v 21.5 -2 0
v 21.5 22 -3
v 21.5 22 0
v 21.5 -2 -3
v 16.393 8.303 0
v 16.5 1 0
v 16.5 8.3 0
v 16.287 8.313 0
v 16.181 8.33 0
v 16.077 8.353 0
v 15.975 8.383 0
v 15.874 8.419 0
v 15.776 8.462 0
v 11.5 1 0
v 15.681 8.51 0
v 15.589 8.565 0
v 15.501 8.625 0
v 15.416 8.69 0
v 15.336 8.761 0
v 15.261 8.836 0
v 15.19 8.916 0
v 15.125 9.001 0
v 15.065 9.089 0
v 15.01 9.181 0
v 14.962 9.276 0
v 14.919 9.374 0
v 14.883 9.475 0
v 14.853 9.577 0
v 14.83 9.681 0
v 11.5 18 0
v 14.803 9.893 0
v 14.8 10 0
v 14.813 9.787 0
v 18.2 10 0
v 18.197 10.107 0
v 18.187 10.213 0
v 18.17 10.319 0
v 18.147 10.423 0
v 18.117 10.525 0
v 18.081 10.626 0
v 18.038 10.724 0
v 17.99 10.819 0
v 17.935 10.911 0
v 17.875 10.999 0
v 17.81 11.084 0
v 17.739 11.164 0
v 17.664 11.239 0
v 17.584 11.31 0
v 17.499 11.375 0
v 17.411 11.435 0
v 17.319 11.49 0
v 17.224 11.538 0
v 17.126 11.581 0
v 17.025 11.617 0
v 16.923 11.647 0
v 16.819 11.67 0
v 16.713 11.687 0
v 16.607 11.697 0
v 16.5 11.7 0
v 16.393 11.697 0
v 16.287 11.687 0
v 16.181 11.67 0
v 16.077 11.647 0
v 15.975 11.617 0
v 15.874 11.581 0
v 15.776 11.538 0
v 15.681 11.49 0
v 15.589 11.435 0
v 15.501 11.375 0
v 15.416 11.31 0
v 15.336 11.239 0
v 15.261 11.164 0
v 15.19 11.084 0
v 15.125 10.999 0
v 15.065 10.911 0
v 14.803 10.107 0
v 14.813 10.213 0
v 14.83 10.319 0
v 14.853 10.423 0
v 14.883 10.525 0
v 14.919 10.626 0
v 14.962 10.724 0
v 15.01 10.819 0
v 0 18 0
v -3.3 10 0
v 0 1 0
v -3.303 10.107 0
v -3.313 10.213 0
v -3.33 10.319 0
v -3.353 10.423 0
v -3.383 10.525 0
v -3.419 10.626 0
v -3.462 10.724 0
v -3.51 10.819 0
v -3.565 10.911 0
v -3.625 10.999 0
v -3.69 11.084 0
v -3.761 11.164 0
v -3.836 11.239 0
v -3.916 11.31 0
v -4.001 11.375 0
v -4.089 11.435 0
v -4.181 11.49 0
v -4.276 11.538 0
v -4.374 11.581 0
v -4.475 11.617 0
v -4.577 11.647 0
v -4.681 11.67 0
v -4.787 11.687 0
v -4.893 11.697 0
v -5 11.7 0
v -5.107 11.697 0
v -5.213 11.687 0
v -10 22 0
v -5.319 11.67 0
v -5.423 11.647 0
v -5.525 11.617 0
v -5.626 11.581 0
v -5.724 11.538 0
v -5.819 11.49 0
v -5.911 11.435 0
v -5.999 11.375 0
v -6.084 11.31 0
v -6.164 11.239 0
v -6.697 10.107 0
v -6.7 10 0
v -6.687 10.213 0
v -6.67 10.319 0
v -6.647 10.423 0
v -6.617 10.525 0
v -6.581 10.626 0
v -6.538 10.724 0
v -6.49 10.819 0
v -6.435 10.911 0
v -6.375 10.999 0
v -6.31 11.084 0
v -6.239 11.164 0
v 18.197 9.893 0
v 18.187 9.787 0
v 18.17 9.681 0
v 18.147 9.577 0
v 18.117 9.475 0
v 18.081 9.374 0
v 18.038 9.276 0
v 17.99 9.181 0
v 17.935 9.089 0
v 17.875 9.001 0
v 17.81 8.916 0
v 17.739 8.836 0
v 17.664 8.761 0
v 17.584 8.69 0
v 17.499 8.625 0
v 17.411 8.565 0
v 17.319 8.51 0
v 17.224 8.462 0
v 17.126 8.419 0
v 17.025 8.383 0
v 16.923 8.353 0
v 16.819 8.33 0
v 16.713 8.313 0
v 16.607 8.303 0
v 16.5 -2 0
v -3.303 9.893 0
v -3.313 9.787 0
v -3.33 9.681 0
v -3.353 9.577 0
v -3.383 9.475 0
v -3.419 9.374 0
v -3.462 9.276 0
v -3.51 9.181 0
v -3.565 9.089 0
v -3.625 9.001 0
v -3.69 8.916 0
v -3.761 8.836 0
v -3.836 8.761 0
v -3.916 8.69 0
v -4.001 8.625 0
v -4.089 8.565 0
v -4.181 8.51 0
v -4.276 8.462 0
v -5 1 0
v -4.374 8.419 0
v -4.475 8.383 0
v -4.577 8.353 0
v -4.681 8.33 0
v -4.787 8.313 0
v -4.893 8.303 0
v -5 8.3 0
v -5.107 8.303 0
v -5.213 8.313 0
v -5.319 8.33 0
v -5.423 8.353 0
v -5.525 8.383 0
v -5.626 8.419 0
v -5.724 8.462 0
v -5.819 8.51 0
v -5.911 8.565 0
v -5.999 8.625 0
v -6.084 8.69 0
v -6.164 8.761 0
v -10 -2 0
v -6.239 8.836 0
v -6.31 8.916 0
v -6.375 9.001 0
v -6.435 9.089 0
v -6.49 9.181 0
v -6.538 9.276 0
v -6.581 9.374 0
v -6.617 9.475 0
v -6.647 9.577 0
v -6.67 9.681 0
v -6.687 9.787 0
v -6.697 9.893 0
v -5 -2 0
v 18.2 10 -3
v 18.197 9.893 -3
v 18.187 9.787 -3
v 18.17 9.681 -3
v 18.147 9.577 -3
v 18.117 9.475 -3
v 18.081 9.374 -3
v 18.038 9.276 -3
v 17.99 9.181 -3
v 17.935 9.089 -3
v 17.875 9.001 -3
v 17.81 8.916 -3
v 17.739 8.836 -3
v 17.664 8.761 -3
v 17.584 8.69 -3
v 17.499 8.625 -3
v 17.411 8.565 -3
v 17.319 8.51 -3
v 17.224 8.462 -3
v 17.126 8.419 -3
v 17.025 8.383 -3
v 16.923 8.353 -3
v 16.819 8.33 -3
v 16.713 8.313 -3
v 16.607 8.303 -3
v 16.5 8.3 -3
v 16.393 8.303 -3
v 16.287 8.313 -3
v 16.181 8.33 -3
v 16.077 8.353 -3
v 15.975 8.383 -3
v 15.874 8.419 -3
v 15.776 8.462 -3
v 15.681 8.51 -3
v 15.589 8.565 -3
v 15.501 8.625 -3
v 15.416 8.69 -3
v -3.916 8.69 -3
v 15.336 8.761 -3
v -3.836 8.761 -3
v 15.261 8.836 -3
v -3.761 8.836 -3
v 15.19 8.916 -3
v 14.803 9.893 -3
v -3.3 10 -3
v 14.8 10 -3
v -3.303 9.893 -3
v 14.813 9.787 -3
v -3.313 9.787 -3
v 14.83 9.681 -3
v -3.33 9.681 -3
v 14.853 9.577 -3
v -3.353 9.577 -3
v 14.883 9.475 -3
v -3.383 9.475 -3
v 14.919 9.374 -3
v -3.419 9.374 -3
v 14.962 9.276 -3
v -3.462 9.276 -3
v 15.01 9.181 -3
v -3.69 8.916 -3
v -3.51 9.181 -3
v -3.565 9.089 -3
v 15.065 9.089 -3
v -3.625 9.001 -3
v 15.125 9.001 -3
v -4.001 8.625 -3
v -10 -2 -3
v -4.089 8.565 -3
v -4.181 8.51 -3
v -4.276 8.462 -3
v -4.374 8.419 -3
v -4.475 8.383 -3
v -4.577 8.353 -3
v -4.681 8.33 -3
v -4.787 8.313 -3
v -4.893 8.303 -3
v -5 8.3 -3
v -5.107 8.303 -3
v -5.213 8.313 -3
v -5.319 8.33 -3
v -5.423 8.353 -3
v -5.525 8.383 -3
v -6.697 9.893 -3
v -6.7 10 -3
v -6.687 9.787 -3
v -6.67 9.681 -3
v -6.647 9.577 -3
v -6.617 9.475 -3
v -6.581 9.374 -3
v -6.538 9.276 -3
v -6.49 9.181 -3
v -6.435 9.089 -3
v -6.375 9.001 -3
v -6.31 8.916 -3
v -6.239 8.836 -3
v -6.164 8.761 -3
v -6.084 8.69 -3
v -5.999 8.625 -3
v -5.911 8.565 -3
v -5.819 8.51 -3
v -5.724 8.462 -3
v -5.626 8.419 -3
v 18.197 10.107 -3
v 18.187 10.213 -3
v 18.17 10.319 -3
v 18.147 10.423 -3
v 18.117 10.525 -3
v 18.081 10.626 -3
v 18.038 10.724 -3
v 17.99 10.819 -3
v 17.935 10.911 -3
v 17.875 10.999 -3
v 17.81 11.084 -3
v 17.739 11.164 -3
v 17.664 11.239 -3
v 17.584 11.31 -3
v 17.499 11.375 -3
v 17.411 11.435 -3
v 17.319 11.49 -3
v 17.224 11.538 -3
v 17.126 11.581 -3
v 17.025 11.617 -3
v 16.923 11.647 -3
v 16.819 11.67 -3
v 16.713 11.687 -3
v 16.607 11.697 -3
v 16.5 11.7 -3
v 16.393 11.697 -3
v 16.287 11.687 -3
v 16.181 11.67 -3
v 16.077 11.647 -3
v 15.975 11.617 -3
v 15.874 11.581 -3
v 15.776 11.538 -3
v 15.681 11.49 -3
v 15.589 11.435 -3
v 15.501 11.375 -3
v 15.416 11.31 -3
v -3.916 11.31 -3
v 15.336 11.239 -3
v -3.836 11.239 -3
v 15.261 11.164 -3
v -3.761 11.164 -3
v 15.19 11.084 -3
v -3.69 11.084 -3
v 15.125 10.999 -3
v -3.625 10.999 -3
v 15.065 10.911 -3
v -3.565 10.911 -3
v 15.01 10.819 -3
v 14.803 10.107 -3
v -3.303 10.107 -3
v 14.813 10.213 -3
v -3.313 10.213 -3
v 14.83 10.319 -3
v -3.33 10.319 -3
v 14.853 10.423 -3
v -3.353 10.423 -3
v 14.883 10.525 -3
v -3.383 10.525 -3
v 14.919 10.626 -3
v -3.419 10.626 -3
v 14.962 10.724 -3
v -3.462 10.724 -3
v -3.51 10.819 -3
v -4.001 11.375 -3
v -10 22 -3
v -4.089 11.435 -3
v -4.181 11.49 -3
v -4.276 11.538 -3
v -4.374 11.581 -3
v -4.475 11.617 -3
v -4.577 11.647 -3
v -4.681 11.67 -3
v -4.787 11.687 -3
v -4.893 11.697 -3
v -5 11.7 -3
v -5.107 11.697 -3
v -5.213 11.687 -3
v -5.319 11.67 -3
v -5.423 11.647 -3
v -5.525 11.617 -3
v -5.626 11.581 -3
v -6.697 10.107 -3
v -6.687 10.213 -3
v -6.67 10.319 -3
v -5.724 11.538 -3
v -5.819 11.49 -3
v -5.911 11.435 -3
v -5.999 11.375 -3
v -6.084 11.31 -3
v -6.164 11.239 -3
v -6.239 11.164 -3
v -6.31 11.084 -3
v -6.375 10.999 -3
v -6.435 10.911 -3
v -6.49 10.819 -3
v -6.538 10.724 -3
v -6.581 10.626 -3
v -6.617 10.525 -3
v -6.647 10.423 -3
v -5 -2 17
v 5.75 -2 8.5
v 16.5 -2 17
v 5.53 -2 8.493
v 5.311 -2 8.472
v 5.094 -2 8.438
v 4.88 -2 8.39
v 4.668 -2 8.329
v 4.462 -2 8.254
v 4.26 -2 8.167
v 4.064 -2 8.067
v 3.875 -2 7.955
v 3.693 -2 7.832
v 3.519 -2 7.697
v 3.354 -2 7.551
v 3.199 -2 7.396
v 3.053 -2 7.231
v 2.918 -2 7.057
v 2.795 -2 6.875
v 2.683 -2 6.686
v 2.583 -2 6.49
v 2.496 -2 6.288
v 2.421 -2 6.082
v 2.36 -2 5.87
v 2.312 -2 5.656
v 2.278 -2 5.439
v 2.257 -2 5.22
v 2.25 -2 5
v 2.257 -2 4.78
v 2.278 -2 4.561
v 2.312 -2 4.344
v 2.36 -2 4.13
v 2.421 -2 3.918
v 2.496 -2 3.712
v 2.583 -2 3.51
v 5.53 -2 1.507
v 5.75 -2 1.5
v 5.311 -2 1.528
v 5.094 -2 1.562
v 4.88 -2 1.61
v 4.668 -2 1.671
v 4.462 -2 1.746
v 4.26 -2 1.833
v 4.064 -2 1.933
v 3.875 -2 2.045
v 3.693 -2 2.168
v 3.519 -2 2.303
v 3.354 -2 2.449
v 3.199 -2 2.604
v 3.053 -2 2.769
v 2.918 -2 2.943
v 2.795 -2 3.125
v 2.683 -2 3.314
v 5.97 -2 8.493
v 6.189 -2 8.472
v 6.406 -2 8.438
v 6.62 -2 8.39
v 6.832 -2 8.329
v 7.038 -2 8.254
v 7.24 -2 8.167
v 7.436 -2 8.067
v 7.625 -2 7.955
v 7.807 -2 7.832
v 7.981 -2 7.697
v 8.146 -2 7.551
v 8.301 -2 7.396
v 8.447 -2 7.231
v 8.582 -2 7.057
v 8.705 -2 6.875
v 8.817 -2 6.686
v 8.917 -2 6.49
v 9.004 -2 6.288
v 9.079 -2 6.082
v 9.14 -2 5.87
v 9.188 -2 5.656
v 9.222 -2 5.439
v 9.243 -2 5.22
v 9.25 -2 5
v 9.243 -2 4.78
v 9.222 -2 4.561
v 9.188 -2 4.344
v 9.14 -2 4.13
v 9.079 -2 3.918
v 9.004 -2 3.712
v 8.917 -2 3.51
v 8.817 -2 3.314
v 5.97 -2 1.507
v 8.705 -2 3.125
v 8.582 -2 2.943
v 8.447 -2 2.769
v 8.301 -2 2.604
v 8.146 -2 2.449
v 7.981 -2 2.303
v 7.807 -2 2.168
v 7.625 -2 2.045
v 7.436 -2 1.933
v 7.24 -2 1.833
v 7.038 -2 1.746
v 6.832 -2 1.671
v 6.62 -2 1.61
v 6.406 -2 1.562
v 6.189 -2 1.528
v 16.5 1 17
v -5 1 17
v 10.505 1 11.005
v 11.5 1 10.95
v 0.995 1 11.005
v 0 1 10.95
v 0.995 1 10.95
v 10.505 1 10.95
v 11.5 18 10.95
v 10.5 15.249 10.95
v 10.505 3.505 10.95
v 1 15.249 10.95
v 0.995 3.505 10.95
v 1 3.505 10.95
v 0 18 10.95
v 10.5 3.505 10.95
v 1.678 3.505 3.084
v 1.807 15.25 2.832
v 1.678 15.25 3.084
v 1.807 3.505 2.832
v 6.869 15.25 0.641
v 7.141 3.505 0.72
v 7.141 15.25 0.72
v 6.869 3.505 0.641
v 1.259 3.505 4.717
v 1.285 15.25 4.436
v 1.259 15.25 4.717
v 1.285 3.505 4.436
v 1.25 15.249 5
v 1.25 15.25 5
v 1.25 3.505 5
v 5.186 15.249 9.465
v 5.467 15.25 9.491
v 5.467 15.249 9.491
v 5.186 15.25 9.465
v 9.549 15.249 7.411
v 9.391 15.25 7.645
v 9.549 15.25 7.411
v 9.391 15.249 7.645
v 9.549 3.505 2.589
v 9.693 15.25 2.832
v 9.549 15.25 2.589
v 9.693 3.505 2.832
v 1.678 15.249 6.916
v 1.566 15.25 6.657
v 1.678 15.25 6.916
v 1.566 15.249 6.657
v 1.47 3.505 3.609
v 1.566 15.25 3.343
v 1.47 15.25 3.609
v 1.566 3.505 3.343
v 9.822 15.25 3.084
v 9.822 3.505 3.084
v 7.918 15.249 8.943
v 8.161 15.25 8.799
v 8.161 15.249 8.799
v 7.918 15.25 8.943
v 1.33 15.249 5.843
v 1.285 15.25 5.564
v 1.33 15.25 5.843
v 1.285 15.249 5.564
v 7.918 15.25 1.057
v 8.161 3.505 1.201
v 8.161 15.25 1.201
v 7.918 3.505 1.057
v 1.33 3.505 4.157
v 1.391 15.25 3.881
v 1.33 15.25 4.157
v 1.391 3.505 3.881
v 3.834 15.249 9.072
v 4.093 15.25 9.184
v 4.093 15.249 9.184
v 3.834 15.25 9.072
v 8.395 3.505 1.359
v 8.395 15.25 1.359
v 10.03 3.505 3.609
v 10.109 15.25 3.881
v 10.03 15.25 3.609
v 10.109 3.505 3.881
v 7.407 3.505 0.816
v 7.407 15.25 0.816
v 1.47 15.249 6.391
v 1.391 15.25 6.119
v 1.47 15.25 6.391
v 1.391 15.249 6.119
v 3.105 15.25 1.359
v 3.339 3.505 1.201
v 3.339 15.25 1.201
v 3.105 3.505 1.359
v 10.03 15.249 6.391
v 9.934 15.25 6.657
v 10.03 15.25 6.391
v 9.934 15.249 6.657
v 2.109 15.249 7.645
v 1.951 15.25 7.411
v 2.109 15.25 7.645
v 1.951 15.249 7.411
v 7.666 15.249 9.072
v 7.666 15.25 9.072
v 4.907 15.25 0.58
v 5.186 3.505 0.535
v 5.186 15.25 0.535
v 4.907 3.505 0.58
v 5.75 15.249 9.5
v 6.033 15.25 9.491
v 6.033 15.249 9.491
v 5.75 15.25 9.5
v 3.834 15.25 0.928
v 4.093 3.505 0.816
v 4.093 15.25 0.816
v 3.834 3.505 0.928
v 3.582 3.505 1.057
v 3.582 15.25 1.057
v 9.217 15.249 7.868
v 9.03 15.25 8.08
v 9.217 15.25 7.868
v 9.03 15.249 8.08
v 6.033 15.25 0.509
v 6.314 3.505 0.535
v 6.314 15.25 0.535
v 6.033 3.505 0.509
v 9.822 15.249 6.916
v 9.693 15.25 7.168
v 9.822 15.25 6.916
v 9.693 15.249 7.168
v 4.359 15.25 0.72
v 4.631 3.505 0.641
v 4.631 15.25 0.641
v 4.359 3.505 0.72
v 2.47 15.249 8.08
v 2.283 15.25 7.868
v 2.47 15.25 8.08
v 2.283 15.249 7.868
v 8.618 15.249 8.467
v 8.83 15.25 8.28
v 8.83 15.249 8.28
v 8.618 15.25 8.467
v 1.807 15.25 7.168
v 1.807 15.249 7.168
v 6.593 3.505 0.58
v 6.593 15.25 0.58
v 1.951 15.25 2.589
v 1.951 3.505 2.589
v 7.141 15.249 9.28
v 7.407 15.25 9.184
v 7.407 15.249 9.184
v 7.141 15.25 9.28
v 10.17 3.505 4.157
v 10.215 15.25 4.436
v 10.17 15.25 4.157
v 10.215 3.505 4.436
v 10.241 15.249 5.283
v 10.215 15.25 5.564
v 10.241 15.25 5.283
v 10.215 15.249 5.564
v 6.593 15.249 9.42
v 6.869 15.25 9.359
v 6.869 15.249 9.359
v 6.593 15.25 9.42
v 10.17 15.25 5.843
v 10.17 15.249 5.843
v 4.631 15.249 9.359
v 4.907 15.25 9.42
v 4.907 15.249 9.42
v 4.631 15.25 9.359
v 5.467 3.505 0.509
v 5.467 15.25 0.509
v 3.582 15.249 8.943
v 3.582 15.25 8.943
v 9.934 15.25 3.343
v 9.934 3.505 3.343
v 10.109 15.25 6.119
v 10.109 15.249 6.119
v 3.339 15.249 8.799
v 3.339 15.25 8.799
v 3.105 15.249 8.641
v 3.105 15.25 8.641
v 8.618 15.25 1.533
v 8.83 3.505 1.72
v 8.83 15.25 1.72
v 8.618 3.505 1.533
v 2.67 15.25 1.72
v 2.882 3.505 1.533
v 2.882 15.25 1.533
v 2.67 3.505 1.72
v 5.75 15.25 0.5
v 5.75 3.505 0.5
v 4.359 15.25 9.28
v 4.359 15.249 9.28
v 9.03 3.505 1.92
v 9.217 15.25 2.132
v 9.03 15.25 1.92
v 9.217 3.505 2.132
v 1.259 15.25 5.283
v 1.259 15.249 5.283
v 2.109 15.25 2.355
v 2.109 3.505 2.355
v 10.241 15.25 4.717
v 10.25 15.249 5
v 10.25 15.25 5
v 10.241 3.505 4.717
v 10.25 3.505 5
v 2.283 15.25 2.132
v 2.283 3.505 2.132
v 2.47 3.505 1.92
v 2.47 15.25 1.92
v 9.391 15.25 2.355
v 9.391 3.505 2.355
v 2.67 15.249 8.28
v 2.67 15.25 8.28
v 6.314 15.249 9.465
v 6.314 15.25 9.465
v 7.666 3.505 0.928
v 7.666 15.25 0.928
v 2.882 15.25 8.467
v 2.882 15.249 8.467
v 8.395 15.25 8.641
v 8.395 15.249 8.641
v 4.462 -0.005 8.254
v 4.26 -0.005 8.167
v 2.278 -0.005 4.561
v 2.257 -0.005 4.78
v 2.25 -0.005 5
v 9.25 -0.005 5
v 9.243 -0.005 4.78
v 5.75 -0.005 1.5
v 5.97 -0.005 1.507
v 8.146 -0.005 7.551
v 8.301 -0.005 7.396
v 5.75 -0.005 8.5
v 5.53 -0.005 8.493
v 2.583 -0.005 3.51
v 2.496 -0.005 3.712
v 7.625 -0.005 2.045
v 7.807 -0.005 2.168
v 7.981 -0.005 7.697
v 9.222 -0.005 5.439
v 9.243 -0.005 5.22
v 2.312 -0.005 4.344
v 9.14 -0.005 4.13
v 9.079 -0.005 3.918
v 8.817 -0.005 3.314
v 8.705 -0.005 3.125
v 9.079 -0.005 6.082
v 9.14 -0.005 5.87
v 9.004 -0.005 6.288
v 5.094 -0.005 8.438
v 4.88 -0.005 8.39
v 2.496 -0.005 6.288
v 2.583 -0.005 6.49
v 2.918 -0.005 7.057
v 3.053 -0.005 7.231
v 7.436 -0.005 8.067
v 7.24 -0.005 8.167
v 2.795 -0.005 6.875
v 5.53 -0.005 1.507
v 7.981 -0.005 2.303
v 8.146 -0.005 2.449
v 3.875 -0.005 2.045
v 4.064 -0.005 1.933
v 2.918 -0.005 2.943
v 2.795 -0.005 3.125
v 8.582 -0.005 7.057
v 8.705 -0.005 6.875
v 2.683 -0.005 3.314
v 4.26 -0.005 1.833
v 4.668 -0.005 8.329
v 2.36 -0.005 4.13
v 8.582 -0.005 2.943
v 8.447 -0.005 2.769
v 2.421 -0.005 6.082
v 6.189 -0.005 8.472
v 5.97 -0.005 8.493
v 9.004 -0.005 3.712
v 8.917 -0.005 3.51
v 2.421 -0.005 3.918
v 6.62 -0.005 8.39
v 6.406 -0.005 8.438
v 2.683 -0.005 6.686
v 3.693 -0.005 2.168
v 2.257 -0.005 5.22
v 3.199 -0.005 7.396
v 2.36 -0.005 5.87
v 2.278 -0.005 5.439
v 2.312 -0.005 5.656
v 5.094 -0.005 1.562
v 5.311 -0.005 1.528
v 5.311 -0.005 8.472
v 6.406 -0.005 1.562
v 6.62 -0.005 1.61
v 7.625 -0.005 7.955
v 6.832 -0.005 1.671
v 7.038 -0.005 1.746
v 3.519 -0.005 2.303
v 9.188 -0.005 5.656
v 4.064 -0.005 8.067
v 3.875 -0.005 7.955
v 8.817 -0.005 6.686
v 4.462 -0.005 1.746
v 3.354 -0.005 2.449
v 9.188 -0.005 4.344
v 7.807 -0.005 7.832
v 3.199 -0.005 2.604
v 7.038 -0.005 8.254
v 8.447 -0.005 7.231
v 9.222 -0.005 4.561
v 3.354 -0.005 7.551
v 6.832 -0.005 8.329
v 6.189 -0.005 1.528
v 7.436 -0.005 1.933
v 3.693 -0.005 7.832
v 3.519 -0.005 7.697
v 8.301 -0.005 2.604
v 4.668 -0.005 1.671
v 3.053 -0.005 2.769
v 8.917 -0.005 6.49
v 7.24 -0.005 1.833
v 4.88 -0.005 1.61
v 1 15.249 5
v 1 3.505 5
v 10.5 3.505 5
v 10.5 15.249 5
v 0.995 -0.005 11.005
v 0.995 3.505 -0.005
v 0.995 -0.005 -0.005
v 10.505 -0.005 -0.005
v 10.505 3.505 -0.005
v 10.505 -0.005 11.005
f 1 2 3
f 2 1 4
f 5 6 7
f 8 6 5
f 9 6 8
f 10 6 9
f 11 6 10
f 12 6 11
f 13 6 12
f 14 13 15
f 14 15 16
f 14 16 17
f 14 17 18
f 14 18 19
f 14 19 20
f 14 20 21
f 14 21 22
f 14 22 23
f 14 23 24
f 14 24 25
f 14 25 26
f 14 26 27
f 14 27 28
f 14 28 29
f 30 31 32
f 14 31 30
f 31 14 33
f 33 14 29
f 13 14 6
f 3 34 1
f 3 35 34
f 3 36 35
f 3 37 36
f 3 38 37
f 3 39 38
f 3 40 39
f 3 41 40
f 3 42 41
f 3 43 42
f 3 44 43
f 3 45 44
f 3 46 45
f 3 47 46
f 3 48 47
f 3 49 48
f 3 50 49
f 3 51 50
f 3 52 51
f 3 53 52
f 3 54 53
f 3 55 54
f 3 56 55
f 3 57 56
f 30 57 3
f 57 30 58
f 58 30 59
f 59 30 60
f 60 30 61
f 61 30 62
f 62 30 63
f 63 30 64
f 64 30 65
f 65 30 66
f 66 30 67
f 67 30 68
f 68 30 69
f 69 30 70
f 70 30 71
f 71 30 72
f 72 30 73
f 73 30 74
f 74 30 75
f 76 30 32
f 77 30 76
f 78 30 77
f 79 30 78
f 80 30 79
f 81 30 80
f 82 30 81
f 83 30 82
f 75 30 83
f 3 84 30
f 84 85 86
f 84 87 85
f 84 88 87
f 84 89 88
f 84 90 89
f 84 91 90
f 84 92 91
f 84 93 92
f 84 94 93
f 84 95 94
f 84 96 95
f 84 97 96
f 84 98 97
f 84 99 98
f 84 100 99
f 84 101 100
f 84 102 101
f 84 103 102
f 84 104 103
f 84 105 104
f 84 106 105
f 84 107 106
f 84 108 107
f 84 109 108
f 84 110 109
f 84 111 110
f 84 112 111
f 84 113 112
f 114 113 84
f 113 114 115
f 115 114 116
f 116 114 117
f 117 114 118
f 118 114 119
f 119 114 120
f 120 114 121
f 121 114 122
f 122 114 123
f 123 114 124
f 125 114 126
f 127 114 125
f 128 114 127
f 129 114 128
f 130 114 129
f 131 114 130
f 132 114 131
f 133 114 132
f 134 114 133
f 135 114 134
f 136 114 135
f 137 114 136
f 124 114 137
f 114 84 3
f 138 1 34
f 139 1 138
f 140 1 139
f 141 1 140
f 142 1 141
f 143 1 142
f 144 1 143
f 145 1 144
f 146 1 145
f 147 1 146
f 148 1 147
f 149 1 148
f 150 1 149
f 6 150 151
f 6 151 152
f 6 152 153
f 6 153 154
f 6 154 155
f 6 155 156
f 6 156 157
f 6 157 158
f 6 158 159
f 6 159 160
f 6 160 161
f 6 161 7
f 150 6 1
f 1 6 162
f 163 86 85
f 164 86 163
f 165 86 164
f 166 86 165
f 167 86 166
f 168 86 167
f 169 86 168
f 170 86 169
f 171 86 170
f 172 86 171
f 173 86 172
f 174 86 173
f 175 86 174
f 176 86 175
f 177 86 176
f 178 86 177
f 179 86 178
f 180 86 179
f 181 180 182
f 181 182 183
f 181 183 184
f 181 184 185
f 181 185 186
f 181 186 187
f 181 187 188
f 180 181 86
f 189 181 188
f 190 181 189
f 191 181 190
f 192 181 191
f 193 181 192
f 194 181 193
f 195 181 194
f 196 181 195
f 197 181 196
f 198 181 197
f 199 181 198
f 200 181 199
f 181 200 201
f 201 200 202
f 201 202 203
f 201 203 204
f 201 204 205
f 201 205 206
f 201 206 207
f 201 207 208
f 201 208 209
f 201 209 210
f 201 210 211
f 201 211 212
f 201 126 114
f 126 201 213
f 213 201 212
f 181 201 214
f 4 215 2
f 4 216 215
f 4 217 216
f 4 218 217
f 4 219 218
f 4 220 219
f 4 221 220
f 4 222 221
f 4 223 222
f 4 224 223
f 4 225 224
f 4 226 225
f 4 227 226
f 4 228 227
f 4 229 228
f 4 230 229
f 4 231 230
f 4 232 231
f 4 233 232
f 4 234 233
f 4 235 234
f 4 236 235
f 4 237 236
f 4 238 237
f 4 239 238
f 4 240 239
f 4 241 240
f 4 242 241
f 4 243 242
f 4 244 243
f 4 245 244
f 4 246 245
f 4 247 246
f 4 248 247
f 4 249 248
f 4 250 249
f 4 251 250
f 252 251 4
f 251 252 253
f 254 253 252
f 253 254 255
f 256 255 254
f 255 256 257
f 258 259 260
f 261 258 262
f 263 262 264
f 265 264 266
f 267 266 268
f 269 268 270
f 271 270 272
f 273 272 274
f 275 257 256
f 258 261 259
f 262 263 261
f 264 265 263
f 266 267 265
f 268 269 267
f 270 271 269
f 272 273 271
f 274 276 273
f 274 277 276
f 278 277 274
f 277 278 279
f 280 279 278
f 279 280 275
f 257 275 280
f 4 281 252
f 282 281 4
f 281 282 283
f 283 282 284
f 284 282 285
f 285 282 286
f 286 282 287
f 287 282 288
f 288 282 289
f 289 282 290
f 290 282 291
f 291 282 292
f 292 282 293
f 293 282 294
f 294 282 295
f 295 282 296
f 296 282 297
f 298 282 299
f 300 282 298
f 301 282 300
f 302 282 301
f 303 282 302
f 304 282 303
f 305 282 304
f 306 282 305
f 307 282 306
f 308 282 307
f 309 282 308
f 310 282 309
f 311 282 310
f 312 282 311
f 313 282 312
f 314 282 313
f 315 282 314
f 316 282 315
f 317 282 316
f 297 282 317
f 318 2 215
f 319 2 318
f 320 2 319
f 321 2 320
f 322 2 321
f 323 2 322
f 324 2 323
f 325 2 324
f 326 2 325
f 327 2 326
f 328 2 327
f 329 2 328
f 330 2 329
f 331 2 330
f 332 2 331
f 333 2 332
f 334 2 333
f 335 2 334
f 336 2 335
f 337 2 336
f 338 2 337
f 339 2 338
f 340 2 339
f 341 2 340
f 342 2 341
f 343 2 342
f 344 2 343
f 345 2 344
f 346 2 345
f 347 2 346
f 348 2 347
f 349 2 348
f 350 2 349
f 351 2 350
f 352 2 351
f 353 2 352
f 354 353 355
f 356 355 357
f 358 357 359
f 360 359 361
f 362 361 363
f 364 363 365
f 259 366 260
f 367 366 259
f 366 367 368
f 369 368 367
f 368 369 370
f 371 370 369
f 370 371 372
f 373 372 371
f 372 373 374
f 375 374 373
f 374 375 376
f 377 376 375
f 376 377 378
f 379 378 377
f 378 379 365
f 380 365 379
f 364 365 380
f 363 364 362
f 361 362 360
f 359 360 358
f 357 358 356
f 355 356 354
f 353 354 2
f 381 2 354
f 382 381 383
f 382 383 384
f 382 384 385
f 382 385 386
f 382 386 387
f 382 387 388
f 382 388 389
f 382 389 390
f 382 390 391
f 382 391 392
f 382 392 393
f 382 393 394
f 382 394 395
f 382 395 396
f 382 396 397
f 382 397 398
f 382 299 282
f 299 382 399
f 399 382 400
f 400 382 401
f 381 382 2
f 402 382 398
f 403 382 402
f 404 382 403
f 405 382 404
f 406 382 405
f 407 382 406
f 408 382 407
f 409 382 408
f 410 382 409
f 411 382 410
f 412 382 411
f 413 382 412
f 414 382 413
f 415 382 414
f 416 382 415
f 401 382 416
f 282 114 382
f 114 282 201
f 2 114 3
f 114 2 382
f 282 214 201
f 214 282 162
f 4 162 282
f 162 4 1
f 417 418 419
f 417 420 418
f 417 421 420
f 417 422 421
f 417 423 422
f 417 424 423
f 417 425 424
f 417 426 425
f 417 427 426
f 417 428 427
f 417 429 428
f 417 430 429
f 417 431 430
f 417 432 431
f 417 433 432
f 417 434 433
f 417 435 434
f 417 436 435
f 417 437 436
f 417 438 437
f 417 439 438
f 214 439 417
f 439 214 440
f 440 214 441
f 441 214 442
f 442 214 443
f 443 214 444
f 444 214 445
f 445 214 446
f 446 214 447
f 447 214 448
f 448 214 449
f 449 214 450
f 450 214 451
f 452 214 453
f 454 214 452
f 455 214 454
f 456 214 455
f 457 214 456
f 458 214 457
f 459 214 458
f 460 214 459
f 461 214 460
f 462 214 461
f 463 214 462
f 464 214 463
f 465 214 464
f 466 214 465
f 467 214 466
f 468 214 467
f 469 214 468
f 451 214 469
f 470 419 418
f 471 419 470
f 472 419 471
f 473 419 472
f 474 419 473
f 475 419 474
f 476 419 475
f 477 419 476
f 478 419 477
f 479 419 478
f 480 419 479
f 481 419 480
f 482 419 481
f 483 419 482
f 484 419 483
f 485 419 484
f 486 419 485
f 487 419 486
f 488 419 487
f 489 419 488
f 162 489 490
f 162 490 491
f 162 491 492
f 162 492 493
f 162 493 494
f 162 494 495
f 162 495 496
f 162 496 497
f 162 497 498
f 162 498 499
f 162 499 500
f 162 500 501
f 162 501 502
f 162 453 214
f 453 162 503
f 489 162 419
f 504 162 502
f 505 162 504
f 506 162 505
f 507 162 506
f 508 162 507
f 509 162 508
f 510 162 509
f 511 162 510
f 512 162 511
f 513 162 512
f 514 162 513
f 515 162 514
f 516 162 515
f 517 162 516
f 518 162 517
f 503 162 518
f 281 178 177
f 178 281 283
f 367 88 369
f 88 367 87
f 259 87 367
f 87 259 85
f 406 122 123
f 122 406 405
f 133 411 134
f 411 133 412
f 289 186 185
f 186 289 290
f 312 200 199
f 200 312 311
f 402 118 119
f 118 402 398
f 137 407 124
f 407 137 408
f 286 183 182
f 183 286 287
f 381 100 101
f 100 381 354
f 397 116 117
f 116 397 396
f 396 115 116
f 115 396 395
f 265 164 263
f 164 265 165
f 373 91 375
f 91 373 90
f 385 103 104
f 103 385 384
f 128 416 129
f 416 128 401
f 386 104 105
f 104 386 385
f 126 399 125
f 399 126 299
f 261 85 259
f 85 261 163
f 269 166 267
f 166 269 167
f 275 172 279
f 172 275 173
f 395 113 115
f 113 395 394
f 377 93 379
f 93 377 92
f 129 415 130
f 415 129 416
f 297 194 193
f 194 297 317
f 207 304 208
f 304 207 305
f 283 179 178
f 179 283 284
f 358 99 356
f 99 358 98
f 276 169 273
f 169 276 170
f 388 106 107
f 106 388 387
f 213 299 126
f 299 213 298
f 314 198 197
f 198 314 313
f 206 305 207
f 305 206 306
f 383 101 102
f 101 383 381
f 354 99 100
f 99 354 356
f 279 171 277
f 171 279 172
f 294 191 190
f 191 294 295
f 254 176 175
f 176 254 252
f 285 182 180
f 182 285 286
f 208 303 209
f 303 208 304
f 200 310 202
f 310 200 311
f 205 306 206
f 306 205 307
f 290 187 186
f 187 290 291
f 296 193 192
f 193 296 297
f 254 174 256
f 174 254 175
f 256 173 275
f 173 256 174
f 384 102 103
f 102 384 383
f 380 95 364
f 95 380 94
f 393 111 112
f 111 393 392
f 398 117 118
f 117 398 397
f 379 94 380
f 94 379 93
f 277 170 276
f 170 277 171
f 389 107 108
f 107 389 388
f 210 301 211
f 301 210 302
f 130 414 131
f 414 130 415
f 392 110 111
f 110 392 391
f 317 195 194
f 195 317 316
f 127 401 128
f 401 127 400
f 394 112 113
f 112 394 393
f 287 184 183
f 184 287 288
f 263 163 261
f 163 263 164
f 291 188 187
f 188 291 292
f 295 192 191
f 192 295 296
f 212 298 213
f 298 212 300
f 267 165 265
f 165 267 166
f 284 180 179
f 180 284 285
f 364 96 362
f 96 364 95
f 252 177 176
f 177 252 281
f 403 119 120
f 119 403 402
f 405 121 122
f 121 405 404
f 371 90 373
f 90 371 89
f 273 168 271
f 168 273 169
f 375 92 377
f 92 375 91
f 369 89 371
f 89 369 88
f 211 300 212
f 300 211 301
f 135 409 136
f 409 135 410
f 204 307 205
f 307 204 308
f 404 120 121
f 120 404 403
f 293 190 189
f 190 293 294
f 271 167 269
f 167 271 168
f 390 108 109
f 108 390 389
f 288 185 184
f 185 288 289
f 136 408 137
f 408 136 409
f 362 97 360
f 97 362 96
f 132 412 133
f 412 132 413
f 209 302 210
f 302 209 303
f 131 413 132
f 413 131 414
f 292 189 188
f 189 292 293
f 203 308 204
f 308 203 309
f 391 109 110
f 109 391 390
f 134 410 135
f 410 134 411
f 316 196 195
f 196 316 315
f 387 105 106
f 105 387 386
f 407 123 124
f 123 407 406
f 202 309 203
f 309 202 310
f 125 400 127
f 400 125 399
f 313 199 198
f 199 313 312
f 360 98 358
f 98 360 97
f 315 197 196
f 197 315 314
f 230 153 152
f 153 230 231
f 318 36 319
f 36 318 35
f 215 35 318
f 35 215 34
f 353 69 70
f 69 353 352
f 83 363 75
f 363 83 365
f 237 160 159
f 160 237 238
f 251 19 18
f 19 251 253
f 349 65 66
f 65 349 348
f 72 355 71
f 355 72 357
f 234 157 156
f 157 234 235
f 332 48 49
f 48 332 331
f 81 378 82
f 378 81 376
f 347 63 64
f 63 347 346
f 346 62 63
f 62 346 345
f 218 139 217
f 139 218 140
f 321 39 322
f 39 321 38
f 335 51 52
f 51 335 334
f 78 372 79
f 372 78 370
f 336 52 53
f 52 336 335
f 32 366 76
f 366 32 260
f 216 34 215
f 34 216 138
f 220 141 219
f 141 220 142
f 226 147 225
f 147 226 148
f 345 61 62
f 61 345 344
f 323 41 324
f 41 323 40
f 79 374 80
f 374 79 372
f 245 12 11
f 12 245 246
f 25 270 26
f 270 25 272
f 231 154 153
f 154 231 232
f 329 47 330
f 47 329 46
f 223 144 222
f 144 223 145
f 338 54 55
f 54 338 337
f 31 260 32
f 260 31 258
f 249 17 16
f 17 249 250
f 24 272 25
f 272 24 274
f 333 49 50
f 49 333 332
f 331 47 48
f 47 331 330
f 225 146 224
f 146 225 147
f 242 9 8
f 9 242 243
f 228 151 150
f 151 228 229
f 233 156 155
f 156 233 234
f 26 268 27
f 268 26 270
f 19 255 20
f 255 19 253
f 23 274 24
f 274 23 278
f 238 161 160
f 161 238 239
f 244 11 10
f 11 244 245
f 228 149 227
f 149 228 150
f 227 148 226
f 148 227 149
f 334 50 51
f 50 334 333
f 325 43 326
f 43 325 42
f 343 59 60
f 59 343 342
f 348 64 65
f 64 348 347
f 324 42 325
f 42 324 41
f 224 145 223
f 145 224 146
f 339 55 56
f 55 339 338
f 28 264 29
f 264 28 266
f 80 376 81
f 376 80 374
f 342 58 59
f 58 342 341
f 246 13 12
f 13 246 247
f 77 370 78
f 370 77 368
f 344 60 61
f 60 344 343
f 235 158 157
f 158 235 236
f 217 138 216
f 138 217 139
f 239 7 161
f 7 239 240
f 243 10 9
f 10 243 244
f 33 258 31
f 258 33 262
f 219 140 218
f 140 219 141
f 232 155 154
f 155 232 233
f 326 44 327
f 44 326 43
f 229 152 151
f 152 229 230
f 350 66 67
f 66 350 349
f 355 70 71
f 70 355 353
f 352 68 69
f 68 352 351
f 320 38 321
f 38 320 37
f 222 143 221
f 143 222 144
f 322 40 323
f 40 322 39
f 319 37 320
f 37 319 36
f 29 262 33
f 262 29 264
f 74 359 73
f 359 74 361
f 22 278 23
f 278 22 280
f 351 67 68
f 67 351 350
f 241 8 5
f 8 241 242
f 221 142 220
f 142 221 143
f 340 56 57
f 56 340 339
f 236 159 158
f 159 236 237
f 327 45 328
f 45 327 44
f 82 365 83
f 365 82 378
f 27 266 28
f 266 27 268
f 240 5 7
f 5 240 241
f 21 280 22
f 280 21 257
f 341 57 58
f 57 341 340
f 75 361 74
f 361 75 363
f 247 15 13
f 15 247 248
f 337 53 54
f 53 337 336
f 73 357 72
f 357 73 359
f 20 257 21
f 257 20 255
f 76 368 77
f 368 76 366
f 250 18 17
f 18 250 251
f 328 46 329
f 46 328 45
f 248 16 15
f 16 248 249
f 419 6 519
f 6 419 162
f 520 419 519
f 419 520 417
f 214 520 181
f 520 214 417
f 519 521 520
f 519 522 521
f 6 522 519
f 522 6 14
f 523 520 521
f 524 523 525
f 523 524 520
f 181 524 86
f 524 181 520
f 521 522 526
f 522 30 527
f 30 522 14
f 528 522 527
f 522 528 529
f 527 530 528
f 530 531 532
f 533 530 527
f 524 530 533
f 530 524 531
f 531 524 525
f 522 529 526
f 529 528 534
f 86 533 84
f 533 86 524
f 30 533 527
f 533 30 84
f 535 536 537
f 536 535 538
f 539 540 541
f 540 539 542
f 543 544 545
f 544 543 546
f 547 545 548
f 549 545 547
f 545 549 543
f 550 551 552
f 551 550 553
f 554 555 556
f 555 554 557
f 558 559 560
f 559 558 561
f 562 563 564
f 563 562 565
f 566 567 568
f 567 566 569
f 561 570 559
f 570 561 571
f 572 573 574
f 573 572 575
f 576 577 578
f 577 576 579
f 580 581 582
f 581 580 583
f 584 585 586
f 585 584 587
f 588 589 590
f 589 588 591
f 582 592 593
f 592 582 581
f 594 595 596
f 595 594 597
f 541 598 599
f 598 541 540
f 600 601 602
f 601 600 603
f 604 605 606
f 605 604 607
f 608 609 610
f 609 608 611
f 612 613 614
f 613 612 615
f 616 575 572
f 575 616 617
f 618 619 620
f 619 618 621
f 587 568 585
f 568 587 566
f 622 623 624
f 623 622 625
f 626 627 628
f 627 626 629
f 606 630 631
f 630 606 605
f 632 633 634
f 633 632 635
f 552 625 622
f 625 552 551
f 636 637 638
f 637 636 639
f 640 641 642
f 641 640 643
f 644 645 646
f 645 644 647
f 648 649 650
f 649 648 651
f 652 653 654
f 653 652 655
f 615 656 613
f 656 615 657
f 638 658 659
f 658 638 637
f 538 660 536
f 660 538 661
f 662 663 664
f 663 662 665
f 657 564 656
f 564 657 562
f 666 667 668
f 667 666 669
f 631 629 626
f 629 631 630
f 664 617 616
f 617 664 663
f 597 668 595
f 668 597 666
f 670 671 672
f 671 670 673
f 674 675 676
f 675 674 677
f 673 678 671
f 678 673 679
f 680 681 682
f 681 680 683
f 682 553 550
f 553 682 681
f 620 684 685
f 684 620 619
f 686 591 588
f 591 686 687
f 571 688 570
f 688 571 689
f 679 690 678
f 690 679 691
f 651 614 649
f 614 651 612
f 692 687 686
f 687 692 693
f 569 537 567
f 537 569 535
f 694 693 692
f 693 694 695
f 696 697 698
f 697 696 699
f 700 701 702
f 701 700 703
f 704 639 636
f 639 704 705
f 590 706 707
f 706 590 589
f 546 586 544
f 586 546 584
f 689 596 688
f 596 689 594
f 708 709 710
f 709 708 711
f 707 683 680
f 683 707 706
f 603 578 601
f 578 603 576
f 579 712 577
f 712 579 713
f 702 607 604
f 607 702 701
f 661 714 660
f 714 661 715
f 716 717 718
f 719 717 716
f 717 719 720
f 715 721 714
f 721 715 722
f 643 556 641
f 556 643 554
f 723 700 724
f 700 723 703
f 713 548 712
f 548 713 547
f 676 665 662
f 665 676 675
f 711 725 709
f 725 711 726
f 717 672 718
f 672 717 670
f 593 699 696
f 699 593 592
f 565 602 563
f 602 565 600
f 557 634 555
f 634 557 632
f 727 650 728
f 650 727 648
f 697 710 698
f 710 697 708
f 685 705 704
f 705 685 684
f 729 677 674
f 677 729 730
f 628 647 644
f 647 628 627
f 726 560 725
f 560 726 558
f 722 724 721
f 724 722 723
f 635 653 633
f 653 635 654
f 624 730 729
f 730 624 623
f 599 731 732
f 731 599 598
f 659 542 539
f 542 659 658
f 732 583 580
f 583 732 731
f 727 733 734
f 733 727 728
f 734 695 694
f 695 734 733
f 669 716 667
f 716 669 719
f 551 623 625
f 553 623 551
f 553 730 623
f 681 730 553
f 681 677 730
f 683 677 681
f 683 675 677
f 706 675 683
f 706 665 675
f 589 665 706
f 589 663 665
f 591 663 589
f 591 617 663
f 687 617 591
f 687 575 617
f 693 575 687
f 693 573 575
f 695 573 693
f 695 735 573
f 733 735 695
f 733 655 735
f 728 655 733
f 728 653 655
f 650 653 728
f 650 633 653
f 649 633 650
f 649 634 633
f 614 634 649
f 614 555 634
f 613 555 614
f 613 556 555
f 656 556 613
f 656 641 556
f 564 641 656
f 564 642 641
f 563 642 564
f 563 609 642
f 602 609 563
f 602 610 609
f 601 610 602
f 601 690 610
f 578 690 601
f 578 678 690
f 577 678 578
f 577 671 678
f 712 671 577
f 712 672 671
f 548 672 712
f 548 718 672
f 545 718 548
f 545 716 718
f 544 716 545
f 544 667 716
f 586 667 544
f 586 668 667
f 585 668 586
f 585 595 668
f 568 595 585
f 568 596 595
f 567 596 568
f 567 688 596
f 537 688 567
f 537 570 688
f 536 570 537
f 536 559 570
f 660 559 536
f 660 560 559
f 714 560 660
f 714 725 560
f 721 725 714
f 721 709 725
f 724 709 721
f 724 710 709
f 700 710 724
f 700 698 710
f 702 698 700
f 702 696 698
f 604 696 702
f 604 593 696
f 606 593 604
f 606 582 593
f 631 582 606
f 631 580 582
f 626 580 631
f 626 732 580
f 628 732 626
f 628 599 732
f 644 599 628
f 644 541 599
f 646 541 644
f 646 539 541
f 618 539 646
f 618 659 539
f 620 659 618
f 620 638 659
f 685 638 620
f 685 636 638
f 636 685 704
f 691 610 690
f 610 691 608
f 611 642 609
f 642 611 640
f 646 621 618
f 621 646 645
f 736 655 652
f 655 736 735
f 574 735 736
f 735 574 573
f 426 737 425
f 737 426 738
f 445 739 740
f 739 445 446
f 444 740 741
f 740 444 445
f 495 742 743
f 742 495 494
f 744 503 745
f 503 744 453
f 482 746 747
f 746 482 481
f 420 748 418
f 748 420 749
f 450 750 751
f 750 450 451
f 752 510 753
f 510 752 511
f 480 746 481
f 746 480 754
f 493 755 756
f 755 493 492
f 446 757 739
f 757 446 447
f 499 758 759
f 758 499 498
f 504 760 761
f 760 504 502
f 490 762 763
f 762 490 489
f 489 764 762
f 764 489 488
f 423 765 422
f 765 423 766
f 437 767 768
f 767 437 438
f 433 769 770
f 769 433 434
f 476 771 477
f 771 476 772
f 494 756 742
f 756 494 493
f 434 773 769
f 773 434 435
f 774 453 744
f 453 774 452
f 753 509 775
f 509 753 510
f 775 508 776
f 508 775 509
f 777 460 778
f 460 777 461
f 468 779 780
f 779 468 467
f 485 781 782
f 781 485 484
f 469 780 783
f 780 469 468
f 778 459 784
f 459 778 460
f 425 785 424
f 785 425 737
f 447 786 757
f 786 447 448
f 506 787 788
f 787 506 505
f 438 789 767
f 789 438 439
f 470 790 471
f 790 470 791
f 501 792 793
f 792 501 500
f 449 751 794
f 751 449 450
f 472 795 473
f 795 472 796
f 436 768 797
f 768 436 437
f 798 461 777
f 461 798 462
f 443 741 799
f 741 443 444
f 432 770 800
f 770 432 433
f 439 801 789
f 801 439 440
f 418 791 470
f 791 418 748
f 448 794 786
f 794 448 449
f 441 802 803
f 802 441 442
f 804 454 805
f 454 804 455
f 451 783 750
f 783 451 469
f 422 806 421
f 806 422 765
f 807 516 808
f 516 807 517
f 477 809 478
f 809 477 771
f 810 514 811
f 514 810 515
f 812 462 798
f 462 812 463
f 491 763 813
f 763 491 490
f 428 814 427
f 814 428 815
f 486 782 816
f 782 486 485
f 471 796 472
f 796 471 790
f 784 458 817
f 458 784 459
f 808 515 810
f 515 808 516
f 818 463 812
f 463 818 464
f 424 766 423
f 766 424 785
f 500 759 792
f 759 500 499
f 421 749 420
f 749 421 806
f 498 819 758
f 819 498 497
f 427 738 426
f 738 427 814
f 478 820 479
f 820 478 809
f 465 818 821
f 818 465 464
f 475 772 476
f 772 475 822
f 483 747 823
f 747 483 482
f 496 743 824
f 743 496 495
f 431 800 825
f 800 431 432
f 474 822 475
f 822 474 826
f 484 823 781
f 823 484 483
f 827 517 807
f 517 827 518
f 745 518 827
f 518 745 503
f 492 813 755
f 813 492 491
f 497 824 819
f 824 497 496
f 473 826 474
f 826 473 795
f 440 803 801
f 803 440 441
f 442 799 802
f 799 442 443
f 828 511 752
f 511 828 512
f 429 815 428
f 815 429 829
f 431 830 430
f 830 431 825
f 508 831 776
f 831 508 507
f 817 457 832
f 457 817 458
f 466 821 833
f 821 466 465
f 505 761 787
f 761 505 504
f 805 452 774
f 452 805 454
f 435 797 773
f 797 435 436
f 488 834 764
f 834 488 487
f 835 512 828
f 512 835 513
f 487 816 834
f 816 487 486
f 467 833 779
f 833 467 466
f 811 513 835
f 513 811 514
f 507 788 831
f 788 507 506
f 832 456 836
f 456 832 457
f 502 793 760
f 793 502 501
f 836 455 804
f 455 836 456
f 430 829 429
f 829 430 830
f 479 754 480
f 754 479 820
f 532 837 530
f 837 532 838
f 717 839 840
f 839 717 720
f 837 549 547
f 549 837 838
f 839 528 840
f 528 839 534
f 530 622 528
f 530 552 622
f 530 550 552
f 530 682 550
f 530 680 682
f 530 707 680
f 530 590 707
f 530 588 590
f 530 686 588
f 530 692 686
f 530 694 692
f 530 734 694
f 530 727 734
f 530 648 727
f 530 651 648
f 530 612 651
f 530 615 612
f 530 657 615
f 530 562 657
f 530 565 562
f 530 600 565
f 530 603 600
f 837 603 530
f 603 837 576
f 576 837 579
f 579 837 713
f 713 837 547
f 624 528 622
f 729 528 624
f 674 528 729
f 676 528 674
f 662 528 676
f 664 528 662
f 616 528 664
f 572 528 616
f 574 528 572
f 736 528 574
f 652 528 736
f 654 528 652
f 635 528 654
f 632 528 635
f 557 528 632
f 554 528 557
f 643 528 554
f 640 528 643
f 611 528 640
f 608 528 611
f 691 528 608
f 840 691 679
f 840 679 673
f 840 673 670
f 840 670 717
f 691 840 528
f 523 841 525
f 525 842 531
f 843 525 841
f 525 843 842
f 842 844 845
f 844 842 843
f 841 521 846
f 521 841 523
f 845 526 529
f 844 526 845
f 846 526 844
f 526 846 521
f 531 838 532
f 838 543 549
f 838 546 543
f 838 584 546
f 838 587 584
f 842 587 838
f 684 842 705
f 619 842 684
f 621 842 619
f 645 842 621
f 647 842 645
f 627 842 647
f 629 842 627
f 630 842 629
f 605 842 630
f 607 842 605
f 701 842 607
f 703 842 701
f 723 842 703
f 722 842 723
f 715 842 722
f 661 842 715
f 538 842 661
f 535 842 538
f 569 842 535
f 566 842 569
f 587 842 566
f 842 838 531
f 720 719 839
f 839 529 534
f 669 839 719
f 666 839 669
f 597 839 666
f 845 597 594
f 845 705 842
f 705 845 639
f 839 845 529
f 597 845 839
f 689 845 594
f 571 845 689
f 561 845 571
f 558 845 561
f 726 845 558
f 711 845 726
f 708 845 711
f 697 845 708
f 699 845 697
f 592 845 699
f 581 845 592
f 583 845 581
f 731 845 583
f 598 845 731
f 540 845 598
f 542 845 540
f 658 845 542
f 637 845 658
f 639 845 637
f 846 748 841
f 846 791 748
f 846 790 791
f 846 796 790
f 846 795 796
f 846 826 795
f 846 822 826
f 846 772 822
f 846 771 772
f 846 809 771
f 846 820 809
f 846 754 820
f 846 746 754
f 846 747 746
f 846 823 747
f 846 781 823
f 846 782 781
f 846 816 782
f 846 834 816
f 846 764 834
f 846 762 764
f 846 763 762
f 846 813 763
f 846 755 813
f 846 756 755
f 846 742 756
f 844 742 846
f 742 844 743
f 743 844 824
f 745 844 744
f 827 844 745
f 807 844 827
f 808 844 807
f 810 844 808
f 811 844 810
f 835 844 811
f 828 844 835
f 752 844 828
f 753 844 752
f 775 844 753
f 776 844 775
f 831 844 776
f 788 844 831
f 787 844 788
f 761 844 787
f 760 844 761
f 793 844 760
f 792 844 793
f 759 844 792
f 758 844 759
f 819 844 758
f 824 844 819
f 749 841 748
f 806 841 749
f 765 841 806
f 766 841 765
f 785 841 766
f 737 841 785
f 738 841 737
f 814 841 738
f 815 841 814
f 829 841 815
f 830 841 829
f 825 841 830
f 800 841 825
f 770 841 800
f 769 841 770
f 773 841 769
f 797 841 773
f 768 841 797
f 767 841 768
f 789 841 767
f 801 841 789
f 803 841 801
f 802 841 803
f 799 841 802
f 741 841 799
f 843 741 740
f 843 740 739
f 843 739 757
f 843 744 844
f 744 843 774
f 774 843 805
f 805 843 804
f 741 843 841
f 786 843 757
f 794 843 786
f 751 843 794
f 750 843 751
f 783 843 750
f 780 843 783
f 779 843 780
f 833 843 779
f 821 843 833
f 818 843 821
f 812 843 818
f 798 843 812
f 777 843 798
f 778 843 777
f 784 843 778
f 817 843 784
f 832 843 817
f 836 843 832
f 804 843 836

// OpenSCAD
// file: utils.scad
module drawComponents() {
    difference() {
        union() {
            let ($componentMode = 0) {
                children();
            }
        }

        let ($componentMode = 1) {
            children();
        }
    }

    let ($componentMode = 2) {
        %children();
    }
}
// main file
include <utils.scad>

$fn = 100;


// #############################################################################
// 9V jack socket
// #############################################################################
module dcJackSocket() {
  	$fn = 100;

	if ($componentMode == 0) {

		cube([11.5, 18, 10.95]);

	} else if ($componentMode == 1) {

		translate([5.75, 1.75, 5.5])
			rotate([0, 180, 0]) {

				cube([9.51, 3.51, 11.01], true);

				translate([0, 7, 0.5]) {

					rotate([90, 0, 0])
						cylinder(13, 4.5, 4.5, true);

					translate([0, -10, 0])
						rotate([90, 0, 0])
							cylinder(12.1, 3.5, 3.5, true);

					translate([0, 0.624, -3])
						cube([9.5, 11.75, 6], true);
				}
			}
	}
}

module dcJackSocketMount() {
	if ($componentMode == 0) {

        translate([-5, -2, -3])
		    cube([11.5 + 10, 3, 20]);

        difference() {
            translate([-10, -2, -3])
                cube([11.5 + 20, 24, 3]);

            translate([-5, 10, -4])
                cylinder(10, 1.7, 1.7);

            translate([11.5 + 5, 10, -4])
                cylinder(10, 1.7, 1.7);


        }

	} else if ($componentMode == 1) {
    }
}

drawComponents() {
	dcJackSocket();
    dcJackSocketMount();
}
